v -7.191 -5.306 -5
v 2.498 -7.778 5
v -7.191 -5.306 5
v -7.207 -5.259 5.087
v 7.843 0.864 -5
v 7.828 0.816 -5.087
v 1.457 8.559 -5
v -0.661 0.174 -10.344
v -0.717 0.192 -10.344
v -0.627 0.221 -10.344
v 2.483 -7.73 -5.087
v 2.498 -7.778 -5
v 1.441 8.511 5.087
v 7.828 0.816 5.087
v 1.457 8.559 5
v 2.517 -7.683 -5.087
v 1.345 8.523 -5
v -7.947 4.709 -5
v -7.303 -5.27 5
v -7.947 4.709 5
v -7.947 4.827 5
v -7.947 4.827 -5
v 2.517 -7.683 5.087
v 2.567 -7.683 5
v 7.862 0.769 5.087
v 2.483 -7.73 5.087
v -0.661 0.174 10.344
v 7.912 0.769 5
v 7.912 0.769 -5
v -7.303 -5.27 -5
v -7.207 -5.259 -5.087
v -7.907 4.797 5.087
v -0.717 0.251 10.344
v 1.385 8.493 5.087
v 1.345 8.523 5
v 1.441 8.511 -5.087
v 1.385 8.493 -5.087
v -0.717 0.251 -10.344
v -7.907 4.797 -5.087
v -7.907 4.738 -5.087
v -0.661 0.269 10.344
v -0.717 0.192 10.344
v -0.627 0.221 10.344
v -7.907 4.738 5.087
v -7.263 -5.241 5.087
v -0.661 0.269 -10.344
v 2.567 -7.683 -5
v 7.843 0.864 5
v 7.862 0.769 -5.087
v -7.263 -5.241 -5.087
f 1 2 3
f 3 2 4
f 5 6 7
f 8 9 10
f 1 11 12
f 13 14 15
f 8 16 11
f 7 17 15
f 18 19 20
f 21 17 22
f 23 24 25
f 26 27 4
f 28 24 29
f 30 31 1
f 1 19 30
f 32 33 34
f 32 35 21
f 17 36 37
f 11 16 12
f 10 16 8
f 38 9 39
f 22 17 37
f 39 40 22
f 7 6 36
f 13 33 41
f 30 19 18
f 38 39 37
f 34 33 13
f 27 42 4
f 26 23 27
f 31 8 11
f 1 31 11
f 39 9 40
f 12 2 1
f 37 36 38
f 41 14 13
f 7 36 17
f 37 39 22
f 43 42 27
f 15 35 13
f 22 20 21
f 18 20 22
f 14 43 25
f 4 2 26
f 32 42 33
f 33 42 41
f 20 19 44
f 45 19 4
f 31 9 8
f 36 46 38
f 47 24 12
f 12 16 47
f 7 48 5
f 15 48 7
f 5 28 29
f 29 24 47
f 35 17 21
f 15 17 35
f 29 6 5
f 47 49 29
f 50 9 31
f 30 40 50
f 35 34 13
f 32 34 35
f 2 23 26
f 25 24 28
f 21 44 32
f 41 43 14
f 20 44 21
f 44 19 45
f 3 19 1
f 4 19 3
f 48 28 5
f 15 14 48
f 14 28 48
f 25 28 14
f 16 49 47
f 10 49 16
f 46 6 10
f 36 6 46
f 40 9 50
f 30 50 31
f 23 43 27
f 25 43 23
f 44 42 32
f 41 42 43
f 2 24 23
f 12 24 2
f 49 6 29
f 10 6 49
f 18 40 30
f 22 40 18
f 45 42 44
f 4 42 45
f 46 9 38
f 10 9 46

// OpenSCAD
// Auto-generated OpenSCAD file

    inner_points = 10*[[0.2467382987372412, -0.7682886734949378, -0.49999999999986955], [0.24673829873693467, -0.7682886734948948, 0.5000000000001305], [-0.786615939624791, 0.4767868289582747, -0.5000000000002401], [-0.7866159396250976, 0.47678682895831764, 0.4999999999997599], [0.7812222187521125, 0.07688996989682276, -0.499999999999742], [0.7812222187518058, 0.07688996989686578, 0.5000000000002579], [0.14257417702561617, 0.8463889489727611, -0.499999999999971], [0.14257417702530947, 0.8463889489728041, 0.500000000000029], [-0.7222389719987257, -0.5211388226006342, -0.5000000000001773], [-0.7222389719990324, -0.5211388226005911, 0.49999999999982264], [-0.06766404342154811, 0.022127650346434623, -1.0257311121191337], [-0.06766404342217727, 0.022127650346523024, 1.0257311121191337]];

    outer_points = 10*[[0.49039615507641166, 0.4938060709977507, -0.6994812171045163], [0.5040254575535104, -0.5059280714671878, -0.6808831929115636], [-0.8147039687334786, 0.4938060709977507, 0.25694319474479665], [-0.8010746662563799, -0.5059280714671878, 0.2755412189377493], [0.8031669173012401, 0.5157349758527835, 0.2500942530026042], [0.8167962197783389, -0.48399916661215503, 0.26869227719555683], [-0.0034293179349679237, 0.5157349758527835, 0.8411970471956072], [0.010199984542130835, -0.48399916661215503, 0.8597950713885598], [-0.5095030419019521, 0.48025326246127786, -0.6952483383208733], [-0.49587373942485335, -0.5194808800036607, -0.6766503141279206], [-0.01397999958724252, 1.02545841377403, -0.019076572038655804], [0.01397999958724252, -1.02545841377403, 0.019076572038655804]];

    // Convex hull for inner set (I)
    module inner_hull() {
        hull() {
            for (p = inner_points) {
                translate(p) sphere(r=0.1);
            }
        }
    }

    // Convex hull for outer set (O) minus inner hull (O \ I)
    module outer_minus_inner() {
        difference() {
            hull() {
                for (p = outer_points) {
                    translate(p) sphere(r=0.1);
                }
            }
            inner_hull(); // Subtract inner hull
        }
    }

    // Convex hull for outer set (O) minus all translated inner hulls
    module outer_minus_AllTranslationInner() {
        difference() {
            hull() {
                for (p = outer_points) {
                    translate(p) sphere(r=0.1);
                }
            }
            hull() {
                translate([0,0,50]) inner_hull();
                translate([0,0,-50]) inner_hull();
            }; // Subtract translated inner hulls
        }
    }

    // Difference between outer_minus_inner and outer_minus_AllTranslationInner
    module outer_minus_inner_diff() {
        difference() {
            // Outer minus inner
            difference() {
                hull() {
                    for (p = outer_points) {
                        translate(p) sphere(r=0.1);
                    }
                }
                inner_hull();
            }

            // Subtract Outer minus AllTranslationInner
            difference() {
                hull() {
                    for (p = outer_points) {
                        translate(p) sphere(r=0.1);
                    }
                }
                hull() {
                    translate([0,0,50]) inner_hull();
                    translate([0,0,-50]) inner_hull();
                };
            }
        }
    }

    // Rendering all with colors applied
    color([1, 0, 0, 0.5]) inner_hull(); // Transparent red
    
